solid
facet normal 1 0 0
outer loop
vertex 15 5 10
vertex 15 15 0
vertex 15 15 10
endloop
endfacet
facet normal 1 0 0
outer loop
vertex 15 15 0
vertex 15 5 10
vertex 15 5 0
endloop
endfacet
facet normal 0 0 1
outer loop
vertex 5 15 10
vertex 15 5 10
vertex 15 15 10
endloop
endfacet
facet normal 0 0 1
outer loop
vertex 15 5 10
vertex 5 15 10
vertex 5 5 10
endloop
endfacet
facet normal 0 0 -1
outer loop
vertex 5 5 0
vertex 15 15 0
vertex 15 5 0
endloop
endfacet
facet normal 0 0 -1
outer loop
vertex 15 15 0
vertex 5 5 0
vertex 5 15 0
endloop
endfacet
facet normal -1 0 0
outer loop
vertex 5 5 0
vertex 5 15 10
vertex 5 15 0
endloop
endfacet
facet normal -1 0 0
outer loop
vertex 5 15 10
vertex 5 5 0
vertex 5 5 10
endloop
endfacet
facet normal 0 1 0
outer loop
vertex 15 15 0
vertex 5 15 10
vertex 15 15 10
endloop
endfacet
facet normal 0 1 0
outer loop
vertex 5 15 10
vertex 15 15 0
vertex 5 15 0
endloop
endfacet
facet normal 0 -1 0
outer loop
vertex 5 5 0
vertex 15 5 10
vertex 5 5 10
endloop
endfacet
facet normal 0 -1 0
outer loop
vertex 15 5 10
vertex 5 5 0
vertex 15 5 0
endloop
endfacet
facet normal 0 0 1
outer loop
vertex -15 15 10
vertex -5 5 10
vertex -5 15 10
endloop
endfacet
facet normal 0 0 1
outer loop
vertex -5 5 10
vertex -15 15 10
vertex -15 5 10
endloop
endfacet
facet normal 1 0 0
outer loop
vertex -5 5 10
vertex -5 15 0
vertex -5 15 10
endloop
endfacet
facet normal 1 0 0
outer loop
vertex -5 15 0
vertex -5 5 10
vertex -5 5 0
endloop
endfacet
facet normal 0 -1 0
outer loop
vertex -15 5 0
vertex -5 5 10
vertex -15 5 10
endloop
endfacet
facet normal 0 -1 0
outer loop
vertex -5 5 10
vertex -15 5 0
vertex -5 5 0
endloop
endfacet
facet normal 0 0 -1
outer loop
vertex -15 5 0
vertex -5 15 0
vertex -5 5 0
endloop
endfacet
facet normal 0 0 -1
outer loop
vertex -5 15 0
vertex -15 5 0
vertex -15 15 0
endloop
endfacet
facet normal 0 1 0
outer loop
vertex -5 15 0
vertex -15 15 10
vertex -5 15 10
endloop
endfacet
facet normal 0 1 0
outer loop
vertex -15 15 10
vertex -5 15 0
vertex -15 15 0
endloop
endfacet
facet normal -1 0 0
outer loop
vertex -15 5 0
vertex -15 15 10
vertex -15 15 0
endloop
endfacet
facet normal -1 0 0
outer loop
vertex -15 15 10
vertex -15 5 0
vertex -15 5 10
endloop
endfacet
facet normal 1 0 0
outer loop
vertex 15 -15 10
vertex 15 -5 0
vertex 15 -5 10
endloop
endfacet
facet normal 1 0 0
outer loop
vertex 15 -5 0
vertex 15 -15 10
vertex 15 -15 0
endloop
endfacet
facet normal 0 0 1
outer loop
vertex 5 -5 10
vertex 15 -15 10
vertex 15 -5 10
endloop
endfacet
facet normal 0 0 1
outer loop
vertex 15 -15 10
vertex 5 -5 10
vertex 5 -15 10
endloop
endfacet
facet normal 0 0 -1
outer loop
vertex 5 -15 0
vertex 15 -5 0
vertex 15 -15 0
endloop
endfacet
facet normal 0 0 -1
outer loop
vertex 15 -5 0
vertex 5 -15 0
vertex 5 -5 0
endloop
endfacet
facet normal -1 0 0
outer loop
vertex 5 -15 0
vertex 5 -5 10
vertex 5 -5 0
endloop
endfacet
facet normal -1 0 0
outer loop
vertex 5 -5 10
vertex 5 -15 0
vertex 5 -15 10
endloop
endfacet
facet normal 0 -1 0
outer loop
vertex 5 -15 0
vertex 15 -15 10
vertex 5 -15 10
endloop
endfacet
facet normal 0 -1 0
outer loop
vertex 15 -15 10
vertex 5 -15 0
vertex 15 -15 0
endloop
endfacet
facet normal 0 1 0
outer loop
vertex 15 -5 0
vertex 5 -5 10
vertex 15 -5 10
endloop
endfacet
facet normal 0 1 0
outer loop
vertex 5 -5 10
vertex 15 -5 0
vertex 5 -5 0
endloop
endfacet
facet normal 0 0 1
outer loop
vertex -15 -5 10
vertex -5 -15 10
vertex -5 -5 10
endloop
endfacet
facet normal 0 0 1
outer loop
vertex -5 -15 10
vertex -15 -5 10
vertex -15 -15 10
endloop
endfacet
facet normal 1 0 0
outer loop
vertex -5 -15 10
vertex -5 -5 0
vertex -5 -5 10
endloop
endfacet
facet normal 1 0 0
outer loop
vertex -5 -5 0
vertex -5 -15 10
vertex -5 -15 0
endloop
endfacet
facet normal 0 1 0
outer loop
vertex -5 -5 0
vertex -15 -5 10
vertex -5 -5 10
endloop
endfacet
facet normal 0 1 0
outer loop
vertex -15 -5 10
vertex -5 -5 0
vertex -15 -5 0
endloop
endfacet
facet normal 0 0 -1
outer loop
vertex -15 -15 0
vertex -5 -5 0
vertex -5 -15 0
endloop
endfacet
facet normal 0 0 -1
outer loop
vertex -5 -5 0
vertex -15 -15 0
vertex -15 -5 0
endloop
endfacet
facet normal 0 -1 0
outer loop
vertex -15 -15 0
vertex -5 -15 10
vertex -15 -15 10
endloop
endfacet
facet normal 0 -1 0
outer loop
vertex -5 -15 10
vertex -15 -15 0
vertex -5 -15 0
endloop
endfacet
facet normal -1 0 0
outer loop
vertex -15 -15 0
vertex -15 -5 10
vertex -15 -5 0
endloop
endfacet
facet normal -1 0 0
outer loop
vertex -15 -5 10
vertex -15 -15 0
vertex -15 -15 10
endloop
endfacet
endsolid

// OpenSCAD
// A custom mirror module that retains the original
// object in addition to the mirrored one.
module mirror_copy(v = [1, 0, 0]) {
    children();
    mirror(v) children();
}

module mirroring_object(){
        difference() {
            cube(10);
            //sphere(10);
            //cylinder(r = 8, h = 30, center = true);
        }
}

// Define example object.
module object(spacing_x=5, spacing_y=5) {
    translate([spacing_x, spacing_y, 0]) {
        mirroring_object();
    }
}

// Call mirror_copy twice, once using the default to
// create a duplicate mirrored on X axis and
// then mirror again on Y axis.

    
    mirror_copy([0, 1, 0])
        mirror_copy()
            object();
            
